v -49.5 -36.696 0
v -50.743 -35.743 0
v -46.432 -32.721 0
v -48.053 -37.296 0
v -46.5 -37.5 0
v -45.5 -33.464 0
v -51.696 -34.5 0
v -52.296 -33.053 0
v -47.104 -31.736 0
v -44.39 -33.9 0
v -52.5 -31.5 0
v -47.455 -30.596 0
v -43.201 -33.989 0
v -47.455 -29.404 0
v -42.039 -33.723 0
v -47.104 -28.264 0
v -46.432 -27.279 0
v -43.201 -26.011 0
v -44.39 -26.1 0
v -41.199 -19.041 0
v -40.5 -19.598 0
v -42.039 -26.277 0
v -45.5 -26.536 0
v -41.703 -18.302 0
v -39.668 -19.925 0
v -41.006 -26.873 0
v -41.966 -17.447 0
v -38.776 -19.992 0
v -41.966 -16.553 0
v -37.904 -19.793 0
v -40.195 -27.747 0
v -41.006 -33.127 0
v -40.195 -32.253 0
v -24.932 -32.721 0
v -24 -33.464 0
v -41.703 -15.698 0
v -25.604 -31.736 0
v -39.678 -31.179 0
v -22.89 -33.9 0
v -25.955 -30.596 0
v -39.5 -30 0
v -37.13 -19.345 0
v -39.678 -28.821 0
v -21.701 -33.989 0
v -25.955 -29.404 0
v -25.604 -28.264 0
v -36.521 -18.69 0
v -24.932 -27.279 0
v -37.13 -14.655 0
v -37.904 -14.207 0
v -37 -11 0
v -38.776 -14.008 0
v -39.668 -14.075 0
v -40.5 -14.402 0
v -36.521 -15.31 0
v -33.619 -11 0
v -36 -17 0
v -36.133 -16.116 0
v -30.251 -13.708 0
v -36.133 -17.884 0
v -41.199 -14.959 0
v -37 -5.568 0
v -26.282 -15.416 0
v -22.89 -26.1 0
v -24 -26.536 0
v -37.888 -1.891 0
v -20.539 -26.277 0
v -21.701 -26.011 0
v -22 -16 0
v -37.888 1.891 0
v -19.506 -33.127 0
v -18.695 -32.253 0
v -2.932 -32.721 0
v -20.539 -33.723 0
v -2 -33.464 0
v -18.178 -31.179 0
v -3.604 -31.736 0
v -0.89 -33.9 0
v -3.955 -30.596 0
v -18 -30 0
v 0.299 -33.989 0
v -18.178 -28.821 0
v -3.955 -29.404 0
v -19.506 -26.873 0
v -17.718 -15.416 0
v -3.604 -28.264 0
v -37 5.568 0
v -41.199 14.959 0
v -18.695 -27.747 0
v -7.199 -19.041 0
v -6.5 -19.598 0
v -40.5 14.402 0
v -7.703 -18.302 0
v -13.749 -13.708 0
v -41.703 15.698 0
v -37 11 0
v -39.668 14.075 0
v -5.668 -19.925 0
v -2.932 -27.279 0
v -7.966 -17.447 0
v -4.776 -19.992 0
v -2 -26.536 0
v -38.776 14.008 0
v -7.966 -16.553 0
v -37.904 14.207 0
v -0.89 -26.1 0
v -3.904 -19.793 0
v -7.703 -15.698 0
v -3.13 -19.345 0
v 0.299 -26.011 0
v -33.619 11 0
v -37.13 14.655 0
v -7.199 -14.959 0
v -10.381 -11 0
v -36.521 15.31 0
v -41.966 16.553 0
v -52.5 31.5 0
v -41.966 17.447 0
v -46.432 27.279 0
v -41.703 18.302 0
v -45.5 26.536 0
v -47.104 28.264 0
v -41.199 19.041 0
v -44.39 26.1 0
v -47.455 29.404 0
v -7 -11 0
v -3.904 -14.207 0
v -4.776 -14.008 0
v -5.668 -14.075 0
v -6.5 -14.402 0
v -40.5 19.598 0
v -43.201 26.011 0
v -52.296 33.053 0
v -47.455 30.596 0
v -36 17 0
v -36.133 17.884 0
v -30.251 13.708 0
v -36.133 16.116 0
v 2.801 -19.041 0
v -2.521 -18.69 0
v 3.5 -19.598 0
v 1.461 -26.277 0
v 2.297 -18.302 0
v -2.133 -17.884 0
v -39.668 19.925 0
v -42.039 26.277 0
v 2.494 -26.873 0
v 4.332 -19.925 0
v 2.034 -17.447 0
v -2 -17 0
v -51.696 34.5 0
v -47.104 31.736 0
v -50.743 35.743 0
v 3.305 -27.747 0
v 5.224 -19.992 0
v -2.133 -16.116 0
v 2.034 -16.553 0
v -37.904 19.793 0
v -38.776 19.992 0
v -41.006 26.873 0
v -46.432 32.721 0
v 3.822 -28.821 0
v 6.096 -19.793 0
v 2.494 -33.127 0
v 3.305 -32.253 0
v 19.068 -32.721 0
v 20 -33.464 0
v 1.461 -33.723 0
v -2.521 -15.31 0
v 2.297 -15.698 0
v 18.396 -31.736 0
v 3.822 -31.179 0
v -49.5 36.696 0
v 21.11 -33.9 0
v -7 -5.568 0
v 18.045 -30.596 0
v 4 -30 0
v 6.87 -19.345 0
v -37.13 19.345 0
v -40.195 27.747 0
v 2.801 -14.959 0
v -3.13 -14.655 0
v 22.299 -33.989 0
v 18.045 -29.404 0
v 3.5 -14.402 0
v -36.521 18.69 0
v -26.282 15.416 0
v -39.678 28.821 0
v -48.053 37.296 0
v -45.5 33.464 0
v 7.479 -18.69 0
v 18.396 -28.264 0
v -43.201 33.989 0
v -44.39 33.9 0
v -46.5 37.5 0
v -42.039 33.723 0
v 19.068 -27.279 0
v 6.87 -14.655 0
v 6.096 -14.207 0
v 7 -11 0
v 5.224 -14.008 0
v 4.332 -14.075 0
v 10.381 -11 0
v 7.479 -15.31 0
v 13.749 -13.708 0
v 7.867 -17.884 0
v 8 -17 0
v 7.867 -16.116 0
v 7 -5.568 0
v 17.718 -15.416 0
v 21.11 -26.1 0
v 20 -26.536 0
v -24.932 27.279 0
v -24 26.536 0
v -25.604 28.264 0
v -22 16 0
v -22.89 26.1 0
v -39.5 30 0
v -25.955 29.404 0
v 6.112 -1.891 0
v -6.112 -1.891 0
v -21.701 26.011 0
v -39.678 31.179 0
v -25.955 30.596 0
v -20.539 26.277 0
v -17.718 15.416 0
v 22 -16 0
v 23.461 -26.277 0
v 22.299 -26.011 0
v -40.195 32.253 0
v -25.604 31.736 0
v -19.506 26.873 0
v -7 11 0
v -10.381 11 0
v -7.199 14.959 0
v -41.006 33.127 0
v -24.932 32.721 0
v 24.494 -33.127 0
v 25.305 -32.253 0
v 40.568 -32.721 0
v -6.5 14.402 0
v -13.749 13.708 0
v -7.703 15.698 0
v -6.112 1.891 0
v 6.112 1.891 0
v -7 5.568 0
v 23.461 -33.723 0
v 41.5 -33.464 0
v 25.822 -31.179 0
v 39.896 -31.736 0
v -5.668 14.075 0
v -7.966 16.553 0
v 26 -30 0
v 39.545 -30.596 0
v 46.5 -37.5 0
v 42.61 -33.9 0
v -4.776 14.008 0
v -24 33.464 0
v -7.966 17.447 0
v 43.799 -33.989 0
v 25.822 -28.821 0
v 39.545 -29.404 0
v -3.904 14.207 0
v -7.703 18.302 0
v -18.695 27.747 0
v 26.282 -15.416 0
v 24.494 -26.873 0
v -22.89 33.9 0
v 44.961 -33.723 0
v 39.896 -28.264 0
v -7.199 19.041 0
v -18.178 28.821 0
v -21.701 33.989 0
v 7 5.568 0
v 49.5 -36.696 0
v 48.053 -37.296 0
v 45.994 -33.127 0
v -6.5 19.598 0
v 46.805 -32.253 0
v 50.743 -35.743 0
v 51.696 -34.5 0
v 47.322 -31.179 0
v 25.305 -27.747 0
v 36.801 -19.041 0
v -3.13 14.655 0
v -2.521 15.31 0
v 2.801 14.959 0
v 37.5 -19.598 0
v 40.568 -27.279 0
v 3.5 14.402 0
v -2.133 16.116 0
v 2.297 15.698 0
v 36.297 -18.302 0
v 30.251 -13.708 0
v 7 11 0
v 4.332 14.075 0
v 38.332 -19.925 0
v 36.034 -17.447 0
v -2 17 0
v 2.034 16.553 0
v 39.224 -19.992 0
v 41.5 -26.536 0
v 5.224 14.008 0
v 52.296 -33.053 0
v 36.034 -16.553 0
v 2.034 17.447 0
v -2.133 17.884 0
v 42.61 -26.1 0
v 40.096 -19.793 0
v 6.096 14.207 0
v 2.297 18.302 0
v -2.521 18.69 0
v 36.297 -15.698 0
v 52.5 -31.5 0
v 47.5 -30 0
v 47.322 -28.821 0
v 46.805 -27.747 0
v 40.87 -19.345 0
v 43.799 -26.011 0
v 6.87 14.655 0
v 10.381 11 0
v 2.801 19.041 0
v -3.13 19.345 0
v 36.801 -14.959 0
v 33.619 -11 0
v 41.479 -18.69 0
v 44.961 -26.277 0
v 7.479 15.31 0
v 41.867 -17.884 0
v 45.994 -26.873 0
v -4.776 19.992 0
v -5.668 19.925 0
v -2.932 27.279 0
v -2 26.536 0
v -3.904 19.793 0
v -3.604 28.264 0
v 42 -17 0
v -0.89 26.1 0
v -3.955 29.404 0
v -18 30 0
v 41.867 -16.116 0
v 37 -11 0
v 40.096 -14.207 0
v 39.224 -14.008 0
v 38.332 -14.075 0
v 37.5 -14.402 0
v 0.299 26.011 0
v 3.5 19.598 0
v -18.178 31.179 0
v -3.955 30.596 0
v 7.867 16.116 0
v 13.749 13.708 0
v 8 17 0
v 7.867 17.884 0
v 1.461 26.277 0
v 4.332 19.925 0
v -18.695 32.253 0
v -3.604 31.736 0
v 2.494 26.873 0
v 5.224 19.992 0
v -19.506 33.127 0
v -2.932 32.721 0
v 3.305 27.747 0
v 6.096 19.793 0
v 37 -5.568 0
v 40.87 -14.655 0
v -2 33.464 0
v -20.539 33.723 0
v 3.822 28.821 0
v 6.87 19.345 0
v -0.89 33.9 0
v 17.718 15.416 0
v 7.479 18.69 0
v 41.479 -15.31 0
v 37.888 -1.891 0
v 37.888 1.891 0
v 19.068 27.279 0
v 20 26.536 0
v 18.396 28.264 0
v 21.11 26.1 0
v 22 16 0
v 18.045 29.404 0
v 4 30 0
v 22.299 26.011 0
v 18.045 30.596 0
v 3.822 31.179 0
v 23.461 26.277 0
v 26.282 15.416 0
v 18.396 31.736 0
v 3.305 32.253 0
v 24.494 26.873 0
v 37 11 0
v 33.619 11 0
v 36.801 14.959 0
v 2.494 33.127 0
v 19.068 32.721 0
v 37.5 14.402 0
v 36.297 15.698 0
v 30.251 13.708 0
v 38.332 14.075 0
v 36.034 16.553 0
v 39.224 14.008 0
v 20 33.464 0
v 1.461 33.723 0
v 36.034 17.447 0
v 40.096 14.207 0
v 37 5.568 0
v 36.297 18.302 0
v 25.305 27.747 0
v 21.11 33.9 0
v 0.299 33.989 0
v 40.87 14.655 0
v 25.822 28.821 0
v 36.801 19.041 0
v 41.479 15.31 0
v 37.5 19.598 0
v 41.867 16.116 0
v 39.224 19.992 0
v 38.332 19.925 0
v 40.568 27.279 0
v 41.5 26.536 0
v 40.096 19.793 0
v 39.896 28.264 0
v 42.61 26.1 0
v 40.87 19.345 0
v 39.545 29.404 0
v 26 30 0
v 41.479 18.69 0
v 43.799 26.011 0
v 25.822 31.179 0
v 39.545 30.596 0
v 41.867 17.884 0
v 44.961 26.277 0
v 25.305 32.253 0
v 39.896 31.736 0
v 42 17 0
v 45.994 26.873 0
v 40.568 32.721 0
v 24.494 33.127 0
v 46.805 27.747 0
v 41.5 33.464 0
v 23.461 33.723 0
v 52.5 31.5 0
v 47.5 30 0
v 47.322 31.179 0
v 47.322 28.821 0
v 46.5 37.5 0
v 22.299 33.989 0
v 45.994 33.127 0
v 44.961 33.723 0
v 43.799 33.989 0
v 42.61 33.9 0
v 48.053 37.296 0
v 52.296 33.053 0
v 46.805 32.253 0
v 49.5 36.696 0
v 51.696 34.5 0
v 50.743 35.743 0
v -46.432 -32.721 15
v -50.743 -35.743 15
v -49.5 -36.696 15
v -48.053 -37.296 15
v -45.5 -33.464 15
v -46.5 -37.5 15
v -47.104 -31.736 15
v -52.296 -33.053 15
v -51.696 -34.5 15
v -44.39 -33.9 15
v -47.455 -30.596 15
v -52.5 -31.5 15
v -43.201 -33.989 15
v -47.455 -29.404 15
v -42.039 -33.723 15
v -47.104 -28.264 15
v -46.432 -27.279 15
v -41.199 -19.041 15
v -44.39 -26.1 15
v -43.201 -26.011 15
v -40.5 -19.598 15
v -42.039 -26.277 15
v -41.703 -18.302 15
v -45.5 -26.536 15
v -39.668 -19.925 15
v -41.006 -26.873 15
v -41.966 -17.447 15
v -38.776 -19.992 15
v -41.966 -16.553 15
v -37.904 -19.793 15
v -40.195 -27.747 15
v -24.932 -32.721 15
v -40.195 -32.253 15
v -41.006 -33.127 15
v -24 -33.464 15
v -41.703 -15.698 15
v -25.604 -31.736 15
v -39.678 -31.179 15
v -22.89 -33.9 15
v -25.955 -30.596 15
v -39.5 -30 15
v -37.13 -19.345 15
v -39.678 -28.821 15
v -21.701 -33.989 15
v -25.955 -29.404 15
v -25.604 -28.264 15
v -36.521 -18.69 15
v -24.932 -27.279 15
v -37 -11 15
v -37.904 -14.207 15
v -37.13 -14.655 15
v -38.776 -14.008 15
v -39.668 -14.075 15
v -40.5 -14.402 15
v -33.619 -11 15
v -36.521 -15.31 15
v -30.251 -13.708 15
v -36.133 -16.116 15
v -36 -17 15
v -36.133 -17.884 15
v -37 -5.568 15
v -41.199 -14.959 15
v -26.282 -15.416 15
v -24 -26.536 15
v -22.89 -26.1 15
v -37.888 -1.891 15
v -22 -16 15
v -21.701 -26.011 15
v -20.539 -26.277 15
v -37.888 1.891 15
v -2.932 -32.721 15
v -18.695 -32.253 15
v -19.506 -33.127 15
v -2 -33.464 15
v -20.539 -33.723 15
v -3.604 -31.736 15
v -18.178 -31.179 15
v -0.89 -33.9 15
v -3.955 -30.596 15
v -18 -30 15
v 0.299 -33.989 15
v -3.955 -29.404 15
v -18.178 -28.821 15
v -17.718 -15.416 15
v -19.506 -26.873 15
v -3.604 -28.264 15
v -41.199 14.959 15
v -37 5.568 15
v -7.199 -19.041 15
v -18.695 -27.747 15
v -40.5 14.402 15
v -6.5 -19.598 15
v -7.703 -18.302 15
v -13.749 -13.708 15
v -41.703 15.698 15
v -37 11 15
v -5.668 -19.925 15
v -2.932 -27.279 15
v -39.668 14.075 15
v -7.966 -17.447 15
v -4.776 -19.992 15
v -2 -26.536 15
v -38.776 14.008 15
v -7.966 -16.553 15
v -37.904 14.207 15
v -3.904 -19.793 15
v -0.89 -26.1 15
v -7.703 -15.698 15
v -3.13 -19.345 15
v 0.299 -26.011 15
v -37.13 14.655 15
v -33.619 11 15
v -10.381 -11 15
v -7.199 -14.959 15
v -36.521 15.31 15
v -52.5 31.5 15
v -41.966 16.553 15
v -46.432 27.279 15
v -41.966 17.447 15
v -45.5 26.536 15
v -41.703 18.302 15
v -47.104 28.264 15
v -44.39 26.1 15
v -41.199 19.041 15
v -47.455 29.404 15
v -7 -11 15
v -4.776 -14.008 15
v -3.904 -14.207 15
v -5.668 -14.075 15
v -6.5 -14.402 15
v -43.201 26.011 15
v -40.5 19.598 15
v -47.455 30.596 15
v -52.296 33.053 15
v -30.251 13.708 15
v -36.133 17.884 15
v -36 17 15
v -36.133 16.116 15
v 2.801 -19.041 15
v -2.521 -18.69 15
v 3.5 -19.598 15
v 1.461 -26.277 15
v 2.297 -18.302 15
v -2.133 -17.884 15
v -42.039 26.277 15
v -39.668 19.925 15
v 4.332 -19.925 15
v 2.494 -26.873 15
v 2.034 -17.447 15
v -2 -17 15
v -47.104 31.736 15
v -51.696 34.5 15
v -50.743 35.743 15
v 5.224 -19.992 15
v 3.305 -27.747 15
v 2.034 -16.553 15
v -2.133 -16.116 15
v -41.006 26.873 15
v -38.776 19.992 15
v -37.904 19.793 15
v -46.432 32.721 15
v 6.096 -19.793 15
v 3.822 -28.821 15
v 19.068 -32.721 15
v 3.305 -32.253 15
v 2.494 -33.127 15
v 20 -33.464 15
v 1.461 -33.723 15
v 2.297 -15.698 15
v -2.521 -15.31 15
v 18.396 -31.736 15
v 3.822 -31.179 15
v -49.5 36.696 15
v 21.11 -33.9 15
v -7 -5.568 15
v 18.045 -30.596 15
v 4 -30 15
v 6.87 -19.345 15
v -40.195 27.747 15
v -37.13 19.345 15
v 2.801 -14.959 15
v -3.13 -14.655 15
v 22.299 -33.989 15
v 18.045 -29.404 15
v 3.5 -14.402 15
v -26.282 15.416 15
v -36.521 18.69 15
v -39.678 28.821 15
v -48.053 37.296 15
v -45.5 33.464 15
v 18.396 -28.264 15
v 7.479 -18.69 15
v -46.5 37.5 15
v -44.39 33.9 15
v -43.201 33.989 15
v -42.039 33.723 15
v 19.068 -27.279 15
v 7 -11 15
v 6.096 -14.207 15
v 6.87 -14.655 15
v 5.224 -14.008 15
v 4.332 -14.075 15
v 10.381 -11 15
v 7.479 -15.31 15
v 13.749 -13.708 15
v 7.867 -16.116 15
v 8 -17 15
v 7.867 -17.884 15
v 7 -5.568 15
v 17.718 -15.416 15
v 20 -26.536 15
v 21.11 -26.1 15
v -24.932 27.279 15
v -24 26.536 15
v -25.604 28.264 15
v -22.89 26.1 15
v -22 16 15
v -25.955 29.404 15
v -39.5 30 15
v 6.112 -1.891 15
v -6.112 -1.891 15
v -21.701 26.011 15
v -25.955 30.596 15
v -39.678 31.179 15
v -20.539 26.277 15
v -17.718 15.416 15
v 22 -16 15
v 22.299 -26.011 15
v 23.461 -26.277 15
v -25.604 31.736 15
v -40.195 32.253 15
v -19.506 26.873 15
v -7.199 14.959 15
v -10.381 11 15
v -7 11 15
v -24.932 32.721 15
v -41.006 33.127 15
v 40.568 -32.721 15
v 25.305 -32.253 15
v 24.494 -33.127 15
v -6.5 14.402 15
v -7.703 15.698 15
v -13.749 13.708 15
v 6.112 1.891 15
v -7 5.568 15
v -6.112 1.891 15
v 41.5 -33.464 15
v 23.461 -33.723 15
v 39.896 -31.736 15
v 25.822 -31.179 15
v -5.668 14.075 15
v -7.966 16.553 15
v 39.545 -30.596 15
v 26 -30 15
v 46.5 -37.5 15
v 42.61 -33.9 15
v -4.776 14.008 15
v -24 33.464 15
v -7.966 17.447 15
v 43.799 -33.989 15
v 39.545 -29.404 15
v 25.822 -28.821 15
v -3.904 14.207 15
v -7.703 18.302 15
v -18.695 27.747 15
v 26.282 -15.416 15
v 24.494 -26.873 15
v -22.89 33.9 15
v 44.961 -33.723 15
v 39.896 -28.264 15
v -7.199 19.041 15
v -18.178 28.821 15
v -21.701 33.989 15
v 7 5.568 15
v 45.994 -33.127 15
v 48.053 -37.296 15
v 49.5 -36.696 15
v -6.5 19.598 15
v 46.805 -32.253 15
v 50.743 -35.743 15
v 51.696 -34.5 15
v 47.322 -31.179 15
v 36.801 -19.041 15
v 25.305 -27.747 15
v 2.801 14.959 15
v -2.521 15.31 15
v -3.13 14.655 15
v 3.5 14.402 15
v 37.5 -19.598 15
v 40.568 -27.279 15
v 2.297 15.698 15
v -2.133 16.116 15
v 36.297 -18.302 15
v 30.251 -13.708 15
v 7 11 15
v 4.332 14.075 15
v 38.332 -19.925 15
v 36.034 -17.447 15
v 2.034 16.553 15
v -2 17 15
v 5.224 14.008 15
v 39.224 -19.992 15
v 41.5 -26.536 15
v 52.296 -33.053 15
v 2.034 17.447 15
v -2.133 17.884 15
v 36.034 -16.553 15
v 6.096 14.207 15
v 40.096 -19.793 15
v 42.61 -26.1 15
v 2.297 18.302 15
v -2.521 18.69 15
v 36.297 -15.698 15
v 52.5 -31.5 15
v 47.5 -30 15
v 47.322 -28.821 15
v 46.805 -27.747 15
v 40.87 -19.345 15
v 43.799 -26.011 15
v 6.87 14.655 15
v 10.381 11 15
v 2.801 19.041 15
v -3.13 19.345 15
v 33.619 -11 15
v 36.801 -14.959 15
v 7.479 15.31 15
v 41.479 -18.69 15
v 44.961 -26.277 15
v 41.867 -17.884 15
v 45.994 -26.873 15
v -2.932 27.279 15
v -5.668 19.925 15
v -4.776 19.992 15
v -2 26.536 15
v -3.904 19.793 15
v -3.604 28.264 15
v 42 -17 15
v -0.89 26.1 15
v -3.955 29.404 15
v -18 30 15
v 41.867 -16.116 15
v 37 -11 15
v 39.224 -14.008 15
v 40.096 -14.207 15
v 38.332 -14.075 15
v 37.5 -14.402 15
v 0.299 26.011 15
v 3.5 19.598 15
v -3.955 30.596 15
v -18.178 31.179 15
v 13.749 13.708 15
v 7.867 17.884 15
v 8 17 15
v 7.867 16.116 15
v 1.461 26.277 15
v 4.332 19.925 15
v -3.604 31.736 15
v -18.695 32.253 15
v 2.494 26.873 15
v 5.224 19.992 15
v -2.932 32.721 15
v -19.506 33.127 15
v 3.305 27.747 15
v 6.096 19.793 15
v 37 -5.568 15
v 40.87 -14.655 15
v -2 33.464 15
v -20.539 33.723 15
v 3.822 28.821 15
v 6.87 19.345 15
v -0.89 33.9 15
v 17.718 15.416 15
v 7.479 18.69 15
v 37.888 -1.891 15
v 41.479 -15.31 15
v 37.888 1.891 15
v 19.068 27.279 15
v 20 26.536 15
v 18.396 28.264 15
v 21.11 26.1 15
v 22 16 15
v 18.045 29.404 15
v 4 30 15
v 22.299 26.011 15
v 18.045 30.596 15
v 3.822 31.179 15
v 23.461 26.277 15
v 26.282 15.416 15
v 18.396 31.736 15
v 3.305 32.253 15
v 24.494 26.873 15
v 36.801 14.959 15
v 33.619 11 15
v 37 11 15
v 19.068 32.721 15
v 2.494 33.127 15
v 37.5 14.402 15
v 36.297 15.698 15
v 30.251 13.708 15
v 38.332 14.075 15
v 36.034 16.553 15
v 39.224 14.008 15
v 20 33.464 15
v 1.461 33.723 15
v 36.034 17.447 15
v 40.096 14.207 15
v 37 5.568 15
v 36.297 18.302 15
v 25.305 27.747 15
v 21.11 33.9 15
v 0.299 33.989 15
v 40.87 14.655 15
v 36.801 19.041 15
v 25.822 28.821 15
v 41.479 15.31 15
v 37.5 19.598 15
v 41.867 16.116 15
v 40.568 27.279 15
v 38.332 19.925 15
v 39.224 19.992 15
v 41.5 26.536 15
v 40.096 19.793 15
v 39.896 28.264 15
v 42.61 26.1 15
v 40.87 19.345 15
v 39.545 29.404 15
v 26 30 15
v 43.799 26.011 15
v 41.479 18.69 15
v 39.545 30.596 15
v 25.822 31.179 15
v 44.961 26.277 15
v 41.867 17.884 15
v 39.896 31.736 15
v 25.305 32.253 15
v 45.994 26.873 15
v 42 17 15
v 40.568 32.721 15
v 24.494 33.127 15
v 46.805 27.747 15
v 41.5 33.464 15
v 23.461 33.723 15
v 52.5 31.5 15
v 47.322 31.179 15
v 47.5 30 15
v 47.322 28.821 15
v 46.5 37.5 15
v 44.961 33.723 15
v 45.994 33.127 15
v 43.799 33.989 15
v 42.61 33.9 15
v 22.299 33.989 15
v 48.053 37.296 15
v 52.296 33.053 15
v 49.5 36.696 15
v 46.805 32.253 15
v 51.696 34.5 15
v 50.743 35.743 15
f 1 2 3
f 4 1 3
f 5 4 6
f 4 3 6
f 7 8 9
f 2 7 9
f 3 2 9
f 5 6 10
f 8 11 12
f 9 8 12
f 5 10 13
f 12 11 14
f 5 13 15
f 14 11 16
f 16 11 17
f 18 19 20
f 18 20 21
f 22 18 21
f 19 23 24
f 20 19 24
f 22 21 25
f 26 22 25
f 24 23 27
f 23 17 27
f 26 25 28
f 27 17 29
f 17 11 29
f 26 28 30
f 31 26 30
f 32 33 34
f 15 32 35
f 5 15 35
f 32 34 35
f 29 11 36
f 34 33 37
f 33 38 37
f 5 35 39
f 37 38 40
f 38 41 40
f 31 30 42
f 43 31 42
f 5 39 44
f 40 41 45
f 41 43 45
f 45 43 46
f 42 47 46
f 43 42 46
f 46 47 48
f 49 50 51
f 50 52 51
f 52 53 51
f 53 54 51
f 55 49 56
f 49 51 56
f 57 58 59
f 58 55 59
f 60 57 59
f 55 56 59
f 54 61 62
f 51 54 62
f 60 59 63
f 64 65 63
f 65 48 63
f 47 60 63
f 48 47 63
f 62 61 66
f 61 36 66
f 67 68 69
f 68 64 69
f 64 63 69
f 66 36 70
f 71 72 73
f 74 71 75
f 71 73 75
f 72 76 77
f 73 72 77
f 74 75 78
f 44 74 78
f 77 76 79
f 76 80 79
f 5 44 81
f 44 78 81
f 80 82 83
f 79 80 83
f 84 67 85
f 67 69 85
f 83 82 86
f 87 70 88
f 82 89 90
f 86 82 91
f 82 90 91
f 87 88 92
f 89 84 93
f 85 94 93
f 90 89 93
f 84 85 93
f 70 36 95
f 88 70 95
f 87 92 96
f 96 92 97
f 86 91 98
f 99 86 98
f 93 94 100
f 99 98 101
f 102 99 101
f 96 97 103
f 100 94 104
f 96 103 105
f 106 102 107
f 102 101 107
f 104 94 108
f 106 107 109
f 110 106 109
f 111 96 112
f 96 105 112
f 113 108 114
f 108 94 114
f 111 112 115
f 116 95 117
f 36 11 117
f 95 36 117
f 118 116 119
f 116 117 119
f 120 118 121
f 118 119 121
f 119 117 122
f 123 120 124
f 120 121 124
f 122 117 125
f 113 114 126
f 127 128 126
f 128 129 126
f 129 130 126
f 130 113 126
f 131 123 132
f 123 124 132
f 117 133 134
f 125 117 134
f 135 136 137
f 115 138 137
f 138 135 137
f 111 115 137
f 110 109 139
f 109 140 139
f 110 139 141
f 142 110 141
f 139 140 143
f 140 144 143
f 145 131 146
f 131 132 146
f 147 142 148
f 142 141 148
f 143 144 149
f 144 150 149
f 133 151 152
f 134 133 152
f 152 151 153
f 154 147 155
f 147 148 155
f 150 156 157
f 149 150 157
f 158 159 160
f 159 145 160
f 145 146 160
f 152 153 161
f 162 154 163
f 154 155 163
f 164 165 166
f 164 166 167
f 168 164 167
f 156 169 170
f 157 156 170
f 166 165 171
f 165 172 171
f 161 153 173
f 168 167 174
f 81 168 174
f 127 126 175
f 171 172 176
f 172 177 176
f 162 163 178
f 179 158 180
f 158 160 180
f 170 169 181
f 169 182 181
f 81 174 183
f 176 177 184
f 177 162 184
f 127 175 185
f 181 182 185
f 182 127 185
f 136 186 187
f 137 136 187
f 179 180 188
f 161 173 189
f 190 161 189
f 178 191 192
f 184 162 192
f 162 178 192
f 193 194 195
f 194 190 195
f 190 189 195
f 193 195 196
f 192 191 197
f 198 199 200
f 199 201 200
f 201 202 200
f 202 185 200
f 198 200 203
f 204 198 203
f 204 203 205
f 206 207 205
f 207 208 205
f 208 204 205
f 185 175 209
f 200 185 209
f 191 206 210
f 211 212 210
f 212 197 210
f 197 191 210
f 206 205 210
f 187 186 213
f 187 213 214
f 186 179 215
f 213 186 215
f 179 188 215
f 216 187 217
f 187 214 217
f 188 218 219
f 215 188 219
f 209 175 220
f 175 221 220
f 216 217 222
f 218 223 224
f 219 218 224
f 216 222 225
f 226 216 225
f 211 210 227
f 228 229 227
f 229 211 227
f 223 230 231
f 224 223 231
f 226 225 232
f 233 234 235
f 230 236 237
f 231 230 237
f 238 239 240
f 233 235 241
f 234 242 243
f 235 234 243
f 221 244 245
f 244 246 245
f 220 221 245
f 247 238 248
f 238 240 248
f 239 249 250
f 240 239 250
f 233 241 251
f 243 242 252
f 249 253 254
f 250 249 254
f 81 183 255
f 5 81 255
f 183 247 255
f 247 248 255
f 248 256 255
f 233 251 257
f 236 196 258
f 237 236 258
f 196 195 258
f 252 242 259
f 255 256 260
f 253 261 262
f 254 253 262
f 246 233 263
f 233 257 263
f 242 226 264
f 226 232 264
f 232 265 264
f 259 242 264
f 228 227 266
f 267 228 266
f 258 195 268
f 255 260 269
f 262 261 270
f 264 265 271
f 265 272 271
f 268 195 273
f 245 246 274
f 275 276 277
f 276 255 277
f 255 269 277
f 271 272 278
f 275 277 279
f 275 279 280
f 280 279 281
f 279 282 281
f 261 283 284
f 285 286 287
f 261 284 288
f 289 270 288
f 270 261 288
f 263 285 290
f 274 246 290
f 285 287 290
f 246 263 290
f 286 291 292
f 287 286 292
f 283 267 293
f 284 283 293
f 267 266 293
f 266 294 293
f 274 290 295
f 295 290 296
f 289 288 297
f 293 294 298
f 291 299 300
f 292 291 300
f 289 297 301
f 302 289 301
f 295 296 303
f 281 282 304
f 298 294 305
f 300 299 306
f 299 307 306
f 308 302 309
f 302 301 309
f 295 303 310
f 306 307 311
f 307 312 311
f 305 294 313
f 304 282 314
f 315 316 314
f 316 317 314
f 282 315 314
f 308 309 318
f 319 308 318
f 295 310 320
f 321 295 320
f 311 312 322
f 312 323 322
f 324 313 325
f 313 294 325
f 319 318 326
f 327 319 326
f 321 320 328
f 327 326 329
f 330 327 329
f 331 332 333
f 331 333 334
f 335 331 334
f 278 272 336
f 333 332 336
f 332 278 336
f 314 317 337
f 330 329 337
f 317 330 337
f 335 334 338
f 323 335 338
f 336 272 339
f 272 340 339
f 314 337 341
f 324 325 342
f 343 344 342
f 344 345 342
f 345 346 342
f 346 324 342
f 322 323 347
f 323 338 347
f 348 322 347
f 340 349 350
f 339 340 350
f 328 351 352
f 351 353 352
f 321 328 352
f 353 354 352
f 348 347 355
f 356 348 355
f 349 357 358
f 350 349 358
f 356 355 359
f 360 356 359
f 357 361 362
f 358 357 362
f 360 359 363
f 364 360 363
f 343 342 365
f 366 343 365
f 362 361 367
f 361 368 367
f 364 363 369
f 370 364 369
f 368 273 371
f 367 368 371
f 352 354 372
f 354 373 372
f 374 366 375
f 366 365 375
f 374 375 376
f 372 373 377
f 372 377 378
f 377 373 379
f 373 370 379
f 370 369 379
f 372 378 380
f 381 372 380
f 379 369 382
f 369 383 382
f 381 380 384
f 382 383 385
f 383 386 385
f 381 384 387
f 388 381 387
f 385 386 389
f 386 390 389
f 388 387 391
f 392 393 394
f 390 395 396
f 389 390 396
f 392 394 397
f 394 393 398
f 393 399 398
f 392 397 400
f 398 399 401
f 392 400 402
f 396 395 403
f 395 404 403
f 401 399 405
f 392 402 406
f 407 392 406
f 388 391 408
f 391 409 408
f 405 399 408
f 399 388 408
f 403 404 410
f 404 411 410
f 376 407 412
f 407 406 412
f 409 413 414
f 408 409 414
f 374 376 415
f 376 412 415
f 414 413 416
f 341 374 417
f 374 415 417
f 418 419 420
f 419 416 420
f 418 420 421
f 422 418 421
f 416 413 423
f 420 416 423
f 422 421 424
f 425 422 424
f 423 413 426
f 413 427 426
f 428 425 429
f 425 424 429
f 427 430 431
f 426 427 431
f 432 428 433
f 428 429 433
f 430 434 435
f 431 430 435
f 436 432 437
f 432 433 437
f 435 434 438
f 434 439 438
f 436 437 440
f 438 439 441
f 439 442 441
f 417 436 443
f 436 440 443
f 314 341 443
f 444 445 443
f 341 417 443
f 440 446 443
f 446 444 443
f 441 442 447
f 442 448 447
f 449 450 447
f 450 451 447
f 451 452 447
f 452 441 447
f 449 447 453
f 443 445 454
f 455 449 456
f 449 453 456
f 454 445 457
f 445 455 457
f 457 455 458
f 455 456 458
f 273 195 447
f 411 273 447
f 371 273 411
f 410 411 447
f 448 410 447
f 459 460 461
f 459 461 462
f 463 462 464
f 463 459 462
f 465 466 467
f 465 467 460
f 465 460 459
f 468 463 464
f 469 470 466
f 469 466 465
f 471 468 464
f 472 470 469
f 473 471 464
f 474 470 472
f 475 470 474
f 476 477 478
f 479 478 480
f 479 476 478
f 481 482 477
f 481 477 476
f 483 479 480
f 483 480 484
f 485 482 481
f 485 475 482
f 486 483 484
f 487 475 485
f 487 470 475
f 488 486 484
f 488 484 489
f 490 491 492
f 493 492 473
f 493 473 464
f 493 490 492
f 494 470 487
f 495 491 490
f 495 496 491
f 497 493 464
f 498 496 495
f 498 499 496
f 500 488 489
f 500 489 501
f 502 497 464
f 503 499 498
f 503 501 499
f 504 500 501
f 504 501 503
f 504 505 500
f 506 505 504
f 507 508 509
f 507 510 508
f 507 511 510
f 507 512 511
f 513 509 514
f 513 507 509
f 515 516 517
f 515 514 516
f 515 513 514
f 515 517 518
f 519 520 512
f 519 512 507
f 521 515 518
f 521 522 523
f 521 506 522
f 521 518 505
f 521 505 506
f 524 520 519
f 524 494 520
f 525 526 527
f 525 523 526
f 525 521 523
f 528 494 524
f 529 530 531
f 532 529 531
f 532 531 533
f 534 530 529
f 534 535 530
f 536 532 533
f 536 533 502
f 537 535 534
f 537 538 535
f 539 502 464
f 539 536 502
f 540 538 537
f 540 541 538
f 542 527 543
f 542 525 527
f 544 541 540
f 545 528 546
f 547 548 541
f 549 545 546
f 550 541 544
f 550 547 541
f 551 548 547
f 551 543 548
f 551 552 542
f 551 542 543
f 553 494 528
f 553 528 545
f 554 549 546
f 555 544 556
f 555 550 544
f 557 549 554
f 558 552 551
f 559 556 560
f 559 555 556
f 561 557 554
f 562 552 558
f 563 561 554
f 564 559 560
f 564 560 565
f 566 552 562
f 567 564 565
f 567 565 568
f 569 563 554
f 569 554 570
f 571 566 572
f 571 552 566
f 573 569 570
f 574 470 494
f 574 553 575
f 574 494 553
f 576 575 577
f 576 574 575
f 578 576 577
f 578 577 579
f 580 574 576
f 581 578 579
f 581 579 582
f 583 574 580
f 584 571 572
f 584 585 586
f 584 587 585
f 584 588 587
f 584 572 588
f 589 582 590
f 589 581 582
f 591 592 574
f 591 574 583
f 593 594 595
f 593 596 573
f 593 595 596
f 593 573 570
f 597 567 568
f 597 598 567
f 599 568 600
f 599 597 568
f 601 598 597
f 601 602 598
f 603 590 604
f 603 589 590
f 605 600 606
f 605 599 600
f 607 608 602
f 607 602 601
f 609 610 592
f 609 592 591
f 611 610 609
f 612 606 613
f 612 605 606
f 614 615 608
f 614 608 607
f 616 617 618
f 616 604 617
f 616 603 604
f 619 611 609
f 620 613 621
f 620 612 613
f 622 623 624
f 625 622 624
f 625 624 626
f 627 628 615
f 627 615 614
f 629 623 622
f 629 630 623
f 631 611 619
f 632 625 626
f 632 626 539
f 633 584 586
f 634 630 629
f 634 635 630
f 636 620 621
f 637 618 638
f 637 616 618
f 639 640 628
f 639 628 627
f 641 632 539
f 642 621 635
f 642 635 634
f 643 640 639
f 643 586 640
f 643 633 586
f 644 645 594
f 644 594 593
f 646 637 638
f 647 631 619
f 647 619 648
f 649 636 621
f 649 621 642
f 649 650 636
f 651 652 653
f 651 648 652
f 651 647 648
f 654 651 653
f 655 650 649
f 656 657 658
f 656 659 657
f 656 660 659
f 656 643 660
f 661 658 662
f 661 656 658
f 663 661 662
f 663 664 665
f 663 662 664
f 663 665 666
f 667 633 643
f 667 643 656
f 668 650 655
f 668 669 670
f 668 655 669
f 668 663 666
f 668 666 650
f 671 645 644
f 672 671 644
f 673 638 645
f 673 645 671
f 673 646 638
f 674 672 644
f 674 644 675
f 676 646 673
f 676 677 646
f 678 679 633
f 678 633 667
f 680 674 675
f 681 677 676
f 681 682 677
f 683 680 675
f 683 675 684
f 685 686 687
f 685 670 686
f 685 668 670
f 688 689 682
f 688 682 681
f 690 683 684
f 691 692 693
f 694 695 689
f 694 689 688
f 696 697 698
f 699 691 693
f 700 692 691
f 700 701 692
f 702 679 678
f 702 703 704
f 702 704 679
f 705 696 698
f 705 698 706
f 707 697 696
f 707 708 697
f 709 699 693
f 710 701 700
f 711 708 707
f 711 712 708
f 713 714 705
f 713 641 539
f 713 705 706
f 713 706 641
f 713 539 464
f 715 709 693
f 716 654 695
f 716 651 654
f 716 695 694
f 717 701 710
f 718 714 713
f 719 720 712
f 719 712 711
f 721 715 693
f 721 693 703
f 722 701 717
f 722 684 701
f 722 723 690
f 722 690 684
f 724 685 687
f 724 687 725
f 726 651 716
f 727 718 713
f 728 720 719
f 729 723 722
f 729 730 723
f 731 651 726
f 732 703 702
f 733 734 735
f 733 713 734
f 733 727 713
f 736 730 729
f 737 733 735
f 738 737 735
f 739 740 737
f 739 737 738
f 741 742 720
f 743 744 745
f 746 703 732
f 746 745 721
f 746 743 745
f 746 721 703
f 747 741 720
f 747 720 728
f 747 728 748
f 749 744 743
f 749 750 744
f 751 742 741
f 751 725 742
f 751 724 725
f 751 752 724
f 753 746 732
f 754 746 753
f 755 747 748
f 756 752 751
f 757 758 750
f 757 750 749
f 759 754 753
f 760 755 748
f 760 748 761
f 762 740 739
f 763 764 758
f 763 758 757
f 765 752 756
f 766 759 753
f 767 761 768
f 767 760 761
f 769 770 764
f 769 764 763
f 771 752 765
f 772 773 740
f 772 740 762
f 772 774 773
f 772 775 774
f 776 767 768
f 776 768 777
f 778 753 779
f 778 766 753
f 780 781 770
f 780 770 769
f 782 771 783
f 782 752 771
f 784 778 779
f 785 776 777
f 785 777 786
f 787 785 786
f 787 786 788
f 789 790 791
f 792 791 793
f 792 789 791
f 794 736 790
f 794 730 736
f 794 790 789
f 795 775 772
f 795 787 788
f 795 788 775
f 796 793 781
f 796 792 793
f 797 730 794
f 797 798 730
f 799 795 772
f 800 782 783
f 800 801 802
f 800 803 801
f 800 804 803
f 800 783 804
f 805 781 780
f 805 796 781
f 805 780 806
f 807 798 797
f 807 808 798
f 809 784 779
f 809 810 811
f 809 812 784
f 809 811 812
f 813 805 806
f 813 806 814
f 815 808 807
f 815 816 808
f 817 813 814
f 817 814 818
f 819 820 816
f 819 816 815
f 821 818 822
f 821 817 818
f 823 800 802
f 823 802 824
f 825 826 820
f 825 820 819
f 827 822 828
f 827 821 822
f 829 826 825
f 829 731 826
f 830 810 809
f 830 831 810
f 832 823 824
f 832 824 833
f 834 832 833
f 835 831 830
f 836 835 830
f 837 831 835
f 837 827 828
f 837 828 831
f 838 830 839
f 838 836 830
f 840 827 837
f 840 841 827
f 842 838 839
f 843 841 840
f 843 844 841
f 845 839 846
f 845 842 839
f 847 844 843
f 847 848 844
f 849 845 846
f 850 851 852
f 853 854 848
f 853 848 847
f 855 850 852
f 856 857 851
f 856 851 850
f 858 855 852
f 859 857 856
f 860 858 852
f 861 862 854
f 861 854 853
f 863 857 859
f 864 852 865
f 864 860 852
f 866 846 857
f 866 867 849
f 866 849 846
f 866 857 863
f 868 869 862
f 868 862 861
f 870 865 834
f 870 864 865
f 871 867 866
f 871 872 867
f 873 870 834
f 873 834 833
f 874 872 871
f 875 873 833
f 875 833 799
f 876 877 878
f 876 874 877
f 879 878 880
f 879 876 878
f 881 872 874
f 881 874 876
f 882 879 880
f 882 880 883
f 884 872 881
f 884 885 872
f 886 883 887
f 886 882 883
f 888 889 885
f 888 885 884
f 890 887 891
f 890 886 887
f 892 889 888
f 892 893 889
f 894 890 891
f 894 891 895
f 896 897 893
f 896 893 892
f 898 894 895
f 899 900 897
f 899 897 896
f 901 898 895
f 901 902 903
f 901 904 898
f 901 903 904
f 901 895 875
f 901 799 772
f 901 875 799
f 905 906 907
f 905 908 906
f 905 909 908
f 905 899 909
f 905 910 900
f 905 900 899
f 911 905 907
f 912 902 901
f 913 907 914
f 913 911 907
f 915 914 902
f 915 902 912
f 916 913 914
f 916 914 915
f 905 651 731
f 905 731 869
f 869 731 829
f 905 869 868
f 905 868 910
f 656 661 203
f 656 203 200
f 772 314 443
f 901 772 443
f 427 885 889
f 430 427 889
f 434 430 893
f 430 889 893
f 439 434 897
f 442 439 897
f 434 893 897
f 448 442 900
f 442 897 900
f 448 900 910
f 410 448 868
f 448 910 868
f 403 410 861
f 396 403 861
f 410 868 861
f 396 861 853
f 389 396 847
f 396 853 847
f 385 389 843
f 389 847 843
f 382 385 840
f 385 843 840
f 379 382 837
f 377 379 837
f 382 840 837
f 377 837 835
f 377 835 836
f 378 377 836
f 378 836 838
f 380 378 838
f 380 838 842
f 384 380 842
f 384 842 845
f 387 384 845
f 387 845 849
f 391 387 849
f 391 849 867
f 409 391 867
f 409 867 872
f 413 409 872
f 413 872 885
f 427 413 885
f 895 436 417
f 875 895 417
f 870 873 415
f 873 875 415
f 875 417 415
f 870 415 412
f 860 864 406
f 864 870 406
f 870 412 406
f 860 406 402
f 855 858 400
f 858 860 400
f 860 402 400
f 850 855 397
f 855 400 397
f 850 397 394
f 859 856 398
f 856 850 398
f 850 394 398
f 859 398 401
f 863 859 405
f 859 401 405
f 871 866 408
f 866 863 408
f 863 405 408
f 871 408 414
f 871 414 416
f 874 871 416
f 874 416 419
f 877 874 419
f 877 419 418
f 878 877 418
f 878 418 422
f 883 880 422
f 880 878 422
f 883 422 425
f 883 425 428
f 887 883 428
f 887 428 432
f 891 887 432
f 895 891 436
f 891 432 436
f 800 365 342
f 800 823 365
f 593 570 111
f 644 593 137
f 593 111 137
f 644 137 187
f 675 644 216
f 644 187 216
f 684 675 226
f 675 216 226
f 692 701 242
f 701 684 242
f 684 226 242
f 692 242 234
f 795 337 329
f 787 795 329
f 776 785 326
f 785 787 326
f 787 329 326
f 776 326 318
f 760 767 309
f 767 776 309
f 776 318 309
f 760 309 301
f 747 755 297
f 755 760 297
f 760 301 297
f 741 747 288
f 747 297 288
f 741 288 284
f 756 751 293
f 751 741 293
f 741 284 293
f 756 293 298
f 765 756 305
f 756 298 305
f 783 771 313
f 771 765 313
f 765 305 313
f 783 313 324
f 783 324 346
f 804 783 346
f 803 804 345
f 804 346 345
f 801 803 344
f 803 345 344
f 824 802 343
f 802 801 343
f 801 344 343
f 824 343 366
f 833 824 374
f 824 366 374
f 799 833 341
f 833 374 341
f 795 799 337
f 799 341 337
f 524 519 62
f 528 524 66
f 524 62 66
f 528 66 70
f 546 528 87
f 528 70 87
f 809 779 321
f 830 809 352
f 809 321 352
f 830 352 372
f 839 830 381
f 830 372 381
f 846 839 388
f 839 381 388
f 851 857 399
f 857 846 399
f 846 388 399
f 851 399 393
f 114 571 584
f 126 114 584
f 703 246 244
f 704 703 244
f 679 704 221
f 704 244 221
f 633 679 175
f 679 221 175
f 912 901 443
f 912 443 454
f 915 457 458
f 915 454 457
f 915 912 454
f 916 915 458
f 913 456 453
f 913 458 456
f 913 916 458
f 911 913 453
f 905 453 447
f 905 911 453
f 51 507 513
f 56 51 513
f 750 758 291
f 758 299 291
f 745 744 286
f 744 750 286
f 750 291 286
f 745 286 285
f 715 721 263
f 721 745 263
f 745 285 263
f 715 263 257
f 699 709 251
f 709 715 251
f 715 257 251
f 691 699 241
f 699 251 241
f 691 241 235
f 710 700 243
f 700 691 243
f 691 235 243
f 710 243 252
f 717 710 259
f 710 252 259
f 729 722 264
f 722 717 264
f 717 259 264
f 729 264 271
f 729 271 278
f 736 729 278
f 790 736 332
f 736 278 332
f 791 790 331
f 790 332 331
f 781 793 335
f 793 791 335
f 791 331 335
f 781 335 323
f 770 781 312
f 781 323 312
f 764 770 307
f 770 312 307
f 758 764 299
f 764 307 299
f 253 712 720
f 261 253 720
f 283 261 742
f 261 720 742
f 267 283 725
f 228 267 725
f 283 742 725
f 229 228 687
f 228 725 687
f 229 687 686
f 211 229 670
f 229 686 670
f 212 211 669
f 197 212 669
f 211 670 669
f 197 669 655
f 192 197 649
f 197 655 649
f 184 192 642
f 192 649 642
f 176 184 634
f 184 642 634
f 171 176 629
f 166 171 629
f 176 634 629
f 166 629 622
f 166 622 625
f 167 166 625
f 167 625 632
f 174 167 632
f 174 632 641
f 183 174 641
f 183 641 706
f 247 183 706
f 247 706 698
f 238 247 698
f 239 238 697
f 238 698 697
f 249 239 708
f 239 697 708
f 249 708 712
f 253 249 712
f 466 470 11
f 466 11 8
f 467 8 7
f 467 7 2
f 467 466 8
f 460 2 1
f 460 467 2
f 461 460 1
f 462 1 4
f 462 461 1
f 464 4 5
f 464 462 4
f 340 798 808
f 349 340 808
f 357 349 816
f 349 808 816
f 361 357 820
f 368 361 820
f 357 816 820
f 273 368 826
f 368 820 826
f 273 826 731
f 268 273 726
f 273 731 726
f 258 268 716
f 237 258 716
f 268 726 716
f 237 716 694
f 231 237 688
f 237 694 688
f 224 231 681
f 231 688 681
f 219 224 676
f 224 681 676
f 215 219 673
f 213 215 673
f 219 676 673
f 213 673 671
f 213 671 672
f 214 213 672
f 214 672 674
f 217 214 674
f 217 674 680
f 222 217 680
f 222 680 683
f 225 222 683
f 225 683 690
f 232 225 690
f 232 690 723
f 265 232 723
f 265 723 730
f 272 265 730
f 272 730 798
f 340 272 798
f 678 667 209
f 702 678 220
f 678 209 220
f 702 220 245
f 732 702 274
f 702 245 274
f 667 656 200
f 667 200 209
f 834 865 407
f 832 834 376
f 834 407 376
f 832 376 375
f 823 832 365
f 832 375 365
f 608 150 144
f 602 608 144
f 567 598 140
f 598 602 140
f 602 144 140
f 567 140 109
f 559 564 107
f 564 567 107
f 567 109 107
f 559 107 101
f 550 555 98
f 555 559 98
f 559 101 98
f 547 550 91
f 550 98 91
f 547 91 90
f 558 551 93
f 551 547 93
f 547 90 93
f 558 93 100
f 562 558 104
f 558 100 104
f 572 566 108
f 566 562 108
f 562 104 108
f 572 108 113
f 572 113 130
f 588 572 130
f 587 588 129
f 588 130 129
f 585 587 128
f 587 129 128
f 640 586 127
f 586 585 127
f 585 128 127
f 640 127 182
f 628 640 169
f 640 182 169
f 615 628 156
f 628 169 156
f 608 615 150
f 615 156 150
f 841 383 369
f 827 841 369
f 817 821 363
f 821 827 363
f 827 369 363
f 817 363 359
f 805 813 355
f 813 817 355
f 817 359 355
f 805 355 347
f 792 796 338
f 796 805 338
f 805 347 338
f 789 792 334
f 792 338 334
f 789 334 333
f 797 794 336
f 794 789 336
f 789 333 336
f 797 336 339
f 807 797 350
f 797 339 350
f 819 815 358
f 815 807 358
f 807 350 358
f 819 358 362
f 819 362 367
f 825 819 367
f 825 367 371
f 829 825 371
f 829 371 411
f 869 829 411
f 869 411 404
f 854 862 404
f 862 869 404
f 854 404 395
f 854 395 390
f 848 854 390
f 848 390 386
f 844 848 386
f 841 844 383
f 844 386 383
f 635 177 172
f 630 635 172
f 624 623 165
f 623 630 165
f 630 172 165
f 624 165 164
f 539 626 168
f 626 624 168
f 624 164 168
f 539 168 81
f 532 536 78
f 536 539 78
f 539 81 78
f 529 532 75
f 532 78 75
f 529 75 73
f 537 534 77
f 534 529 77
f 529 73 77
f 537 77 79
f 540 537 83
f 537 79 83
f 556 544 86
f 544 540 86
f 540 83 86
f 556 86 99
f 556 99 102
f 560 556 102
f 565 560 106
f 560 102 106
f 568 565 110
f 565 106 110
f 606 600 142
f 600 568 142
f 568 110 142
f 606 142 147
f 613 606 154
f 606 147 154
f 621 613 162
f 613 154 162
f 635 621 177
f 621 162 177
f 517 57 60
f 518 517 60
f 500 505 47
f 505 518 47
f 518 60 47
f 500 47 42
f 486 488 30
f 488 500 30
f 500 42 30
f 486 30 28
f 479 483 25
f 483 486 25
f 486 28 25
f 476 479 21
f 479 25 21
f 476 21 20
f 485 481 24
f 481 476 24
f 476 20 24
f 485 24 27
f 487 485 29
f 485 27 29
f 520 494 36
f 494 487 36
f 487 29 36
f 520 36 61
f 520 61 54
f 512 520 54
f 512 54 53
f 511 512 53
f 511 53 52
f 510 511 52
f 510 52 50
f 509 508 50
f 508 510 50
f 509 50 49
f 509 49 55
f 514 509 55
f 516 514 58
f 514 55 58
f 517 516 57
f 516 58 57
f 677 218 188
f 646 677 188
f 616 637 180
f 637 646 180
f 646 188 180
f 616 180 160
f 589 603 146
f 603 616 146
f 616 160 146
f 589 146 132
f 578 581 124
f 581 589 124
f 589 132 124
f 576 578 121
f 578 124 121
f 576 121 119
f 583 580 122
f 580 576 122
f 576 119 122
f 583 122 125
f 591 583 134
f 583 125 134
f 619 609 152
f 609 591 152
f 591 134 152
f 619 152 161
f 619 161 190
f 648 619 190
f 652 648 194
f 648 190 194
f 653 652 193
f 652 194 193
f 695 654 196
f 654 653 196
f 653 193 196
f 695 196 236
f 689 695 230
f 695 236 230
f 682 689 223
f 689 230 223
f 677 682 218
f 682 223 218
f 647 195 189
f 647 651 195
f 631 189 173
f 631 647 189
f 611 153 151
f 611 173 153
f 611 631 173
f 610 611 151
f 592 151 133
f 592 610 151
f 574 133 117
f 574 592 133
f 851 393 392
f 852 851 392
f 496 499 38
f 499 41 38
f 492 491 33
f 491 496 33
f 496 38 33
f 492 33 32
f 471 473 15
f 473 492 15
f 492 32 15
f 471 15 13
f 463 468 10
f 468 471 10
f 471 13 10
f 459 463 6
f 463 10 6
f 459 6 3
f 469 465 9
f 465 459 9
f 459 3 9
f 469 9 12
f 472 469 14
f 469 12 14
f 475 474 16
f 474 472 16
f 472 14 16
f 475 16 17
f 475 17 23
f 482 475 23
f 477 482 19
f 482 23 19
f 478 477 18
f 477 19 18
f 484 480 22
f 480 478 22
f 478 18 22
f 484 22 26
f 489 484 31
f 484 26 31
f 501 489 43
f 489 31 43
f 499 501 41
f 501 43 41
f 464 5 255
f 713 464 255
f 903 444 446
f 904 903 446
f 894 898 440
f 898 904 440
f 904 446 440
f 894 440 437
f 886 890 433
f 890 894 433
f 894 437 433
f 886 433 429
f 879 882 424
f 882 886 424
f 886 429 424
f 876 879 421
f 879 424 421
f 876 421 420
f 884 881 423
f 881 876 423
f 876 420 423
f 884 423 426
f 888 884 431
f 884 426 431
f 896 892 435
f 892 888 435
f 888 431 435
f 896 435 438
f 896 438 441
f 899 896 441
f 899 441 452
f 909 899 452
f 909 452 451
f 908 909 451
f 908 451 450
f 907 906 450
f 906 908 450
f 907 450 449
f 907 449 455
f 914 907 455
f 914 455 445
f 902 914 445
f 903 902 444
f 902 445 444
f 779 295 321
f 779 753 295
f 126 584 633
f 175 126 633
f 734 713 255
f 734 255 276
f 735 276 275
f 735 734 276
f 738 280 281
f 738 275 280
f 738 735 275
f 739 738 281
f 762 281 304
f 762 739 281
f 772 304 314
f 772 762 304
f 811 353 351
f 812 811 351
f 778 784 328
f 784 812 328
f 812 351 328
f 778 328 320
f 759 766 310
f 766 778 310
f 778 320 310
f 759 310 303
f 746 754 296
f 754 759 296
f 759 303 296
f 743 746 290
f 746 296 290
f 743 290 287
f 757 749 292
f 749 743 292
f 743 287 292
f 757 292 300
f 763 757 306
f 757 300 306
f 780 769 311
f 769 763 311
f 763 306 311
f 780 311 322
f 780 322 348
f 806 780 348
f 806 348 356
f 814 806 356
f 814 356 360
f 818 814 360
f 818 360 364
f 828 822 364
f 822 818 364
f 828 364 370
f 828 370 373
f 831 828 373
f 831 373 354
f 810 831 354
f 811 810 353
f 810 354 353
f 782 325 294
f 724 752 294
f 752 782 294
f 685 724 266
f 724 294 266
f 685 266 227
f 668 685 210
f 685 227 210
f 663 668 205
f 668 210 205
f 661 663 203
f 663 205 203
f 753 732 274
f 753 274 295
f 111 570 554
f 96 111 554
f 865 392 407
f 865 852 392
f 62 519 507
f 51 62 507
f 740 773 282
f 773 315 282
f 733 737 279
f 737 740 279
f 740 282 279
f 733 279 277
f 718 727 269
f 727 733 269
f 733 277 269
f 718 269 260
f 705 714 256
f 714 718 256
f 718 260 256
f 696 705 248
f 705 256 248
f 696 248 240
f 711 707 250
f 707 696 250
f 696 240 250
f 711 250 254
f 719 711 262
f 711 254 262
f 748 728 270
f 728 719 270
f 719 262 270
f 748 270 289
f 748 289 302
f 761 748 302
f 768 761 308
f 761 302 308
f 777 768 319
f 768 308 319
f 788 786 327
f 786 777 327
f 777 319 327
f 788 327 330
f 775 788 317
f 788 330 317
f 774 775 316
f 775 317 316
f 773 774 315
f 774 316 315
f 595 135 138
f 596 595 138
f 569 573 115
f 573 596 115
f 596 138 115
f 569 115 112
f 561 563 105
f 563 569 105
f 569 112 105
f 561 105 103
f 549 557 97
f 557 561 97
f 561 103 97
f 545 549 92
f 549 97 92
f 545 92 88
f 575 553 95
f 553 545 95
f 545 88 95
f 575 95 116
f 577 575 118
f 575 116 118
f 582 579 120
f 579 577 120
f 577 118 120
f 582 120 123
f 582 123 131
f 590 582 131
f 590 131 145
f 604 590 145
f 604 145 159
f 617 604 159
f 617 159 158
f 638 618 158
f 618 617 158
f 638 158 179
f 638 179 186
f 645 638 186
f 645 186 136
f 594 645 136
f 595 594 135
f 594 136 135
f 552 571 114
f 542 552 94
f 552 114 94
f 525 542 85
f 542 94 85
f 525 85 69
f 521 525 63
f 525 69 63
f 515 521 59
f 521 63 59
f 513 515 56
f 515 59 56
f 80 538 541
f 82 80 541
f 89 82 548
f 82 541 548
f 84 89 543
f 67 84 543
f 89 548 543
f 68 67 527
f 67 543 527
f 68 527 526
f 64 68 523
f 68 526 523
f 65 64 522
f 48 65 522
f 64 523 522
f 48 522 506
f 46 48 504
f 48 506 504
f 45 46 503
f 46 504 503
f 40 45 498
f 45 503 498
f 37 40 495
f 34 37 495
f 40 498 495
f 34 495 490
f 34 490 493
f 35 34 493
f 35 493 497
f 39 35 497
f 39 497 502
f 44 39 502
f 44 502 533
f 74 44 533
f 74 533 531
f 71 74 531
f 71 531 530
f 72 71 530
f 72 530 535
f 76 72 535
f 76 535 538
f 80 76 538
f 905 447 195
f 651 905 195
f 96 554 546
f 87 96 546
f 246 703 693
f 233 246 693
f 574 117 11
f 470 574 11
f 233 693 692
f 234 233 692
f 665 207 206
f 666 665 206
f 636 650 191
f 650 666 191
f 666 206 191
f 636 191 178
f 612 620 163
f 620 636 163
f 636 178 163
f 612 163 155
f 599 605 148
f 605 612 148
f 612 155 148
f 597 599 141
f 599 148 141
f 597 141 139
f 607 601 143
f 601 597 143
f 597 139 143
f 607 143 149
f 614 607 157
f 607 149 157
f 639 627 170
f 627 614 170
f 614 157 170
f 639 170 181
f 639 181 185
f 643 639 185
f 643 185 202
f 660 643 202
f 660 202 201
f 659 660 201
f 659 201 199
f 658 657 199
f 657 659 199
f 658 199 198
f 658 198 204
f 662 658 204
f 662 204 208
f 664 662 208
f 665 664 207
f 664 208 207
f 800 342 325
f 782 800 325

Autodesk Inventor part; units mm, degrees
ref_plane "YZ Plane" through (0, 0, 0) normal (1, 0, 0) x (0, 1, 0)
ref_plane "XZ Plane" through (0, 0, 0) normal (0, 1, 0) x (-1, 0, 0)
ref_plane "XY Plane" through (0, 0, 0) normal (0, 0, 1) x (1, 0, 0)
sketch "Sketch1" plane through (0, 0, 0) normal (0, 0, 1) x (1, 0, 0)
  line L0 (-22, 0) -> (22, 0) construction
  circle A0 centre (-22, 0) radius 16
  circle A1 centre (22, 0) radius 16
  line L1 (43.5, -30) -> (-43.5, -30) construction
  line L2 (-43.5, -30) -> (-43.5, 30) construction
  line L3 (-43.5, 30) -> (43.5, 30) construction
  line L4 (43.5, 30) -> (43.5, -30) construction
  line L5 (43.5, -30) -> (-43.5, 30) construction
  line L6 (-43.5, -30) -> (43.5, 30) construction
  circle A2 centre (-43.5, 30) radius 4
  circle A3 centre (0, 30) radius 4
  circle A4 centre (43.5, 30) radius 4
  circle A5 centre (43.5, -30) radius 4
  circle A6 centre (-43.5, -30) radius 4
  circle A7 centre (0, -30) radius 4
  line L7 (-52.5, -37.5) -> (52.5, -37.5)
  line L8 (52.5, -37.5) -> (52.5, 37.5)
  line L9 (52.5, 37.5) -> (-52.5, 37.5)
  line L10 (-52.5, 37.5) -> (-52.5, -37.5)
  line L11 (-52.5, -37.5) -> (52.5, 37.5) construction
  line L12 (52.5, -37.5) -> (-52.5, 37.5) construction
  line L13 (-5, -17) -> (-39, -17) construction
  line L14 (-39, -17) -> (-39, 17) construction
  line L15 (-39, 17) -> (-5, 17) construction
  line L16 (-5, 17) -> (-5, -17) construction
  line L17 (-5, -17) -> (-39, 17) construction
  line L18 (-39, -17) -> (-5, 17) construction
  line L19 (39, -17) -> (5, -17) construction
  line L20 (5, -17) -> (5, 17) construction
  line L21 (5, 17) -> (39, 17) construction
  line L22 (39, 17) -> (39, -17) construction
  line L23 (39, -17) -> (5, 17) construction
  line L24 (5, -17) -> (39, 17) construction
  circle A8 centre (-39, 17) radius 3
  circle A9 centre (-39, -17) radius 3
  circle A10 centre (-5, -17) radius 3
  circle A11 centre (-5, 17) radius 3
  circle A12 centre (5, 17) radius 3
  circle A13 centre (5, -17) radius 3
  circle A14 centre (39, -17) radius 3
  circle A15 centre (39, 17) radius 3
  point P0 (0, 0)
  point P1 (0, 0)
  dimension "d0" = 60
  dimension "d1" = 87
  dimension "d2" = 44
  dimension "d3" = 32
  dimension "d4" = 8
  dimension "d5" = 105
  dimension "d6" = 75
  dimension "d10" = 34
  dimension "d11" = 6
extrude "Extrusion1" add sketch "Sketch1" along normal blind 15
fillet "Fillet1" radius 6 4 edges at (-52.5, 37.5, 7.5) (52.5, 37.5, 7.5) (52.5, -37.5, 7.5) (-52.5, -37.5, 7.5)
sketch "Sketch2" plane through (0, 0, 15) normal (0, 0, 1) x (1, 0, 0)
  circle A0 centre (22, 0) radius 16 projected
  circle A1 centre (-22, 0) radius 16 projected
  line L0 (37, -11) -> (7, -11)
  line L1 (7, -11) -> (7, 11)
  line L2 (7, 11) -> (37, 11)
  line L3 (37, 11) -> (37, -11)
  line L4 (37, -11) -> (7, 11) construction
  line L5 (7, -11) -> (37, 11) construction
  line L6 (-37, -11) -> (-7, -11)
  line L7 (-7, -11) -> (-7, 11)
  line L8 (-7, 11) -> (-37, 11)
  line L9 (-37, 11) -> (-37, -11)
  line L10 (-37, -11) -> (-7, 11) construction
  line L11 (-7, -11) -> (-37, 11) construction
  point P0 (0, 0)
  dimension "d12" = 22
  dimension "d13" = 30
extrude "Extrusion2" cut sketch "Sketch2" against normal through all contours L3 A0 L0 L1 L2 | A0 L2 L3 | L3 L0 A0 | A0 L1 L2 | L0 L1 A0 | L7 A1 L6 L9 L8 | A1 L8 L7 | L7 L6 A1 | A1 L9 L8 | L6 L9 A1
sketch "Sketch3" plane through (0, 0, 15) normal (0, 0, 1) x (1, 0, 0)
  arc A0 (-10.381, 11) -> (-33.619, 11) centre (-22, 0) ccw construction
  arc A1 (33.619, 11) -> (10.381, 11) centre (22, 0) ccw construction
  line L0 (-22, -30) -> (22, -30) construction
  line L1 (22, -30) -> (22, 30) construction
  line L2 (22, 30) -> (-22, 30) construction
  line L3 (-22, 30) -> (-22, -30) construction
  line L4 (-22, -30) -> (22, 30) construction
  line L5 (22, -30) -> (-22, 30) construction
  circle A2 centre (0, 30) radius 4 construction
  circle A3 centre (-22, 30) radius 4
  circle A4 centre (22, 30) radius 4
  circle A5 centre (22, -30) radius 4
  circle A6 centre (-22, -30) radius 4
  point P0 (0, 0)
  dimension "d16" = 8
extrude "Extrusion3" cut sketch "Sketch3" against normal through all
properties part number "cylinder frame"
